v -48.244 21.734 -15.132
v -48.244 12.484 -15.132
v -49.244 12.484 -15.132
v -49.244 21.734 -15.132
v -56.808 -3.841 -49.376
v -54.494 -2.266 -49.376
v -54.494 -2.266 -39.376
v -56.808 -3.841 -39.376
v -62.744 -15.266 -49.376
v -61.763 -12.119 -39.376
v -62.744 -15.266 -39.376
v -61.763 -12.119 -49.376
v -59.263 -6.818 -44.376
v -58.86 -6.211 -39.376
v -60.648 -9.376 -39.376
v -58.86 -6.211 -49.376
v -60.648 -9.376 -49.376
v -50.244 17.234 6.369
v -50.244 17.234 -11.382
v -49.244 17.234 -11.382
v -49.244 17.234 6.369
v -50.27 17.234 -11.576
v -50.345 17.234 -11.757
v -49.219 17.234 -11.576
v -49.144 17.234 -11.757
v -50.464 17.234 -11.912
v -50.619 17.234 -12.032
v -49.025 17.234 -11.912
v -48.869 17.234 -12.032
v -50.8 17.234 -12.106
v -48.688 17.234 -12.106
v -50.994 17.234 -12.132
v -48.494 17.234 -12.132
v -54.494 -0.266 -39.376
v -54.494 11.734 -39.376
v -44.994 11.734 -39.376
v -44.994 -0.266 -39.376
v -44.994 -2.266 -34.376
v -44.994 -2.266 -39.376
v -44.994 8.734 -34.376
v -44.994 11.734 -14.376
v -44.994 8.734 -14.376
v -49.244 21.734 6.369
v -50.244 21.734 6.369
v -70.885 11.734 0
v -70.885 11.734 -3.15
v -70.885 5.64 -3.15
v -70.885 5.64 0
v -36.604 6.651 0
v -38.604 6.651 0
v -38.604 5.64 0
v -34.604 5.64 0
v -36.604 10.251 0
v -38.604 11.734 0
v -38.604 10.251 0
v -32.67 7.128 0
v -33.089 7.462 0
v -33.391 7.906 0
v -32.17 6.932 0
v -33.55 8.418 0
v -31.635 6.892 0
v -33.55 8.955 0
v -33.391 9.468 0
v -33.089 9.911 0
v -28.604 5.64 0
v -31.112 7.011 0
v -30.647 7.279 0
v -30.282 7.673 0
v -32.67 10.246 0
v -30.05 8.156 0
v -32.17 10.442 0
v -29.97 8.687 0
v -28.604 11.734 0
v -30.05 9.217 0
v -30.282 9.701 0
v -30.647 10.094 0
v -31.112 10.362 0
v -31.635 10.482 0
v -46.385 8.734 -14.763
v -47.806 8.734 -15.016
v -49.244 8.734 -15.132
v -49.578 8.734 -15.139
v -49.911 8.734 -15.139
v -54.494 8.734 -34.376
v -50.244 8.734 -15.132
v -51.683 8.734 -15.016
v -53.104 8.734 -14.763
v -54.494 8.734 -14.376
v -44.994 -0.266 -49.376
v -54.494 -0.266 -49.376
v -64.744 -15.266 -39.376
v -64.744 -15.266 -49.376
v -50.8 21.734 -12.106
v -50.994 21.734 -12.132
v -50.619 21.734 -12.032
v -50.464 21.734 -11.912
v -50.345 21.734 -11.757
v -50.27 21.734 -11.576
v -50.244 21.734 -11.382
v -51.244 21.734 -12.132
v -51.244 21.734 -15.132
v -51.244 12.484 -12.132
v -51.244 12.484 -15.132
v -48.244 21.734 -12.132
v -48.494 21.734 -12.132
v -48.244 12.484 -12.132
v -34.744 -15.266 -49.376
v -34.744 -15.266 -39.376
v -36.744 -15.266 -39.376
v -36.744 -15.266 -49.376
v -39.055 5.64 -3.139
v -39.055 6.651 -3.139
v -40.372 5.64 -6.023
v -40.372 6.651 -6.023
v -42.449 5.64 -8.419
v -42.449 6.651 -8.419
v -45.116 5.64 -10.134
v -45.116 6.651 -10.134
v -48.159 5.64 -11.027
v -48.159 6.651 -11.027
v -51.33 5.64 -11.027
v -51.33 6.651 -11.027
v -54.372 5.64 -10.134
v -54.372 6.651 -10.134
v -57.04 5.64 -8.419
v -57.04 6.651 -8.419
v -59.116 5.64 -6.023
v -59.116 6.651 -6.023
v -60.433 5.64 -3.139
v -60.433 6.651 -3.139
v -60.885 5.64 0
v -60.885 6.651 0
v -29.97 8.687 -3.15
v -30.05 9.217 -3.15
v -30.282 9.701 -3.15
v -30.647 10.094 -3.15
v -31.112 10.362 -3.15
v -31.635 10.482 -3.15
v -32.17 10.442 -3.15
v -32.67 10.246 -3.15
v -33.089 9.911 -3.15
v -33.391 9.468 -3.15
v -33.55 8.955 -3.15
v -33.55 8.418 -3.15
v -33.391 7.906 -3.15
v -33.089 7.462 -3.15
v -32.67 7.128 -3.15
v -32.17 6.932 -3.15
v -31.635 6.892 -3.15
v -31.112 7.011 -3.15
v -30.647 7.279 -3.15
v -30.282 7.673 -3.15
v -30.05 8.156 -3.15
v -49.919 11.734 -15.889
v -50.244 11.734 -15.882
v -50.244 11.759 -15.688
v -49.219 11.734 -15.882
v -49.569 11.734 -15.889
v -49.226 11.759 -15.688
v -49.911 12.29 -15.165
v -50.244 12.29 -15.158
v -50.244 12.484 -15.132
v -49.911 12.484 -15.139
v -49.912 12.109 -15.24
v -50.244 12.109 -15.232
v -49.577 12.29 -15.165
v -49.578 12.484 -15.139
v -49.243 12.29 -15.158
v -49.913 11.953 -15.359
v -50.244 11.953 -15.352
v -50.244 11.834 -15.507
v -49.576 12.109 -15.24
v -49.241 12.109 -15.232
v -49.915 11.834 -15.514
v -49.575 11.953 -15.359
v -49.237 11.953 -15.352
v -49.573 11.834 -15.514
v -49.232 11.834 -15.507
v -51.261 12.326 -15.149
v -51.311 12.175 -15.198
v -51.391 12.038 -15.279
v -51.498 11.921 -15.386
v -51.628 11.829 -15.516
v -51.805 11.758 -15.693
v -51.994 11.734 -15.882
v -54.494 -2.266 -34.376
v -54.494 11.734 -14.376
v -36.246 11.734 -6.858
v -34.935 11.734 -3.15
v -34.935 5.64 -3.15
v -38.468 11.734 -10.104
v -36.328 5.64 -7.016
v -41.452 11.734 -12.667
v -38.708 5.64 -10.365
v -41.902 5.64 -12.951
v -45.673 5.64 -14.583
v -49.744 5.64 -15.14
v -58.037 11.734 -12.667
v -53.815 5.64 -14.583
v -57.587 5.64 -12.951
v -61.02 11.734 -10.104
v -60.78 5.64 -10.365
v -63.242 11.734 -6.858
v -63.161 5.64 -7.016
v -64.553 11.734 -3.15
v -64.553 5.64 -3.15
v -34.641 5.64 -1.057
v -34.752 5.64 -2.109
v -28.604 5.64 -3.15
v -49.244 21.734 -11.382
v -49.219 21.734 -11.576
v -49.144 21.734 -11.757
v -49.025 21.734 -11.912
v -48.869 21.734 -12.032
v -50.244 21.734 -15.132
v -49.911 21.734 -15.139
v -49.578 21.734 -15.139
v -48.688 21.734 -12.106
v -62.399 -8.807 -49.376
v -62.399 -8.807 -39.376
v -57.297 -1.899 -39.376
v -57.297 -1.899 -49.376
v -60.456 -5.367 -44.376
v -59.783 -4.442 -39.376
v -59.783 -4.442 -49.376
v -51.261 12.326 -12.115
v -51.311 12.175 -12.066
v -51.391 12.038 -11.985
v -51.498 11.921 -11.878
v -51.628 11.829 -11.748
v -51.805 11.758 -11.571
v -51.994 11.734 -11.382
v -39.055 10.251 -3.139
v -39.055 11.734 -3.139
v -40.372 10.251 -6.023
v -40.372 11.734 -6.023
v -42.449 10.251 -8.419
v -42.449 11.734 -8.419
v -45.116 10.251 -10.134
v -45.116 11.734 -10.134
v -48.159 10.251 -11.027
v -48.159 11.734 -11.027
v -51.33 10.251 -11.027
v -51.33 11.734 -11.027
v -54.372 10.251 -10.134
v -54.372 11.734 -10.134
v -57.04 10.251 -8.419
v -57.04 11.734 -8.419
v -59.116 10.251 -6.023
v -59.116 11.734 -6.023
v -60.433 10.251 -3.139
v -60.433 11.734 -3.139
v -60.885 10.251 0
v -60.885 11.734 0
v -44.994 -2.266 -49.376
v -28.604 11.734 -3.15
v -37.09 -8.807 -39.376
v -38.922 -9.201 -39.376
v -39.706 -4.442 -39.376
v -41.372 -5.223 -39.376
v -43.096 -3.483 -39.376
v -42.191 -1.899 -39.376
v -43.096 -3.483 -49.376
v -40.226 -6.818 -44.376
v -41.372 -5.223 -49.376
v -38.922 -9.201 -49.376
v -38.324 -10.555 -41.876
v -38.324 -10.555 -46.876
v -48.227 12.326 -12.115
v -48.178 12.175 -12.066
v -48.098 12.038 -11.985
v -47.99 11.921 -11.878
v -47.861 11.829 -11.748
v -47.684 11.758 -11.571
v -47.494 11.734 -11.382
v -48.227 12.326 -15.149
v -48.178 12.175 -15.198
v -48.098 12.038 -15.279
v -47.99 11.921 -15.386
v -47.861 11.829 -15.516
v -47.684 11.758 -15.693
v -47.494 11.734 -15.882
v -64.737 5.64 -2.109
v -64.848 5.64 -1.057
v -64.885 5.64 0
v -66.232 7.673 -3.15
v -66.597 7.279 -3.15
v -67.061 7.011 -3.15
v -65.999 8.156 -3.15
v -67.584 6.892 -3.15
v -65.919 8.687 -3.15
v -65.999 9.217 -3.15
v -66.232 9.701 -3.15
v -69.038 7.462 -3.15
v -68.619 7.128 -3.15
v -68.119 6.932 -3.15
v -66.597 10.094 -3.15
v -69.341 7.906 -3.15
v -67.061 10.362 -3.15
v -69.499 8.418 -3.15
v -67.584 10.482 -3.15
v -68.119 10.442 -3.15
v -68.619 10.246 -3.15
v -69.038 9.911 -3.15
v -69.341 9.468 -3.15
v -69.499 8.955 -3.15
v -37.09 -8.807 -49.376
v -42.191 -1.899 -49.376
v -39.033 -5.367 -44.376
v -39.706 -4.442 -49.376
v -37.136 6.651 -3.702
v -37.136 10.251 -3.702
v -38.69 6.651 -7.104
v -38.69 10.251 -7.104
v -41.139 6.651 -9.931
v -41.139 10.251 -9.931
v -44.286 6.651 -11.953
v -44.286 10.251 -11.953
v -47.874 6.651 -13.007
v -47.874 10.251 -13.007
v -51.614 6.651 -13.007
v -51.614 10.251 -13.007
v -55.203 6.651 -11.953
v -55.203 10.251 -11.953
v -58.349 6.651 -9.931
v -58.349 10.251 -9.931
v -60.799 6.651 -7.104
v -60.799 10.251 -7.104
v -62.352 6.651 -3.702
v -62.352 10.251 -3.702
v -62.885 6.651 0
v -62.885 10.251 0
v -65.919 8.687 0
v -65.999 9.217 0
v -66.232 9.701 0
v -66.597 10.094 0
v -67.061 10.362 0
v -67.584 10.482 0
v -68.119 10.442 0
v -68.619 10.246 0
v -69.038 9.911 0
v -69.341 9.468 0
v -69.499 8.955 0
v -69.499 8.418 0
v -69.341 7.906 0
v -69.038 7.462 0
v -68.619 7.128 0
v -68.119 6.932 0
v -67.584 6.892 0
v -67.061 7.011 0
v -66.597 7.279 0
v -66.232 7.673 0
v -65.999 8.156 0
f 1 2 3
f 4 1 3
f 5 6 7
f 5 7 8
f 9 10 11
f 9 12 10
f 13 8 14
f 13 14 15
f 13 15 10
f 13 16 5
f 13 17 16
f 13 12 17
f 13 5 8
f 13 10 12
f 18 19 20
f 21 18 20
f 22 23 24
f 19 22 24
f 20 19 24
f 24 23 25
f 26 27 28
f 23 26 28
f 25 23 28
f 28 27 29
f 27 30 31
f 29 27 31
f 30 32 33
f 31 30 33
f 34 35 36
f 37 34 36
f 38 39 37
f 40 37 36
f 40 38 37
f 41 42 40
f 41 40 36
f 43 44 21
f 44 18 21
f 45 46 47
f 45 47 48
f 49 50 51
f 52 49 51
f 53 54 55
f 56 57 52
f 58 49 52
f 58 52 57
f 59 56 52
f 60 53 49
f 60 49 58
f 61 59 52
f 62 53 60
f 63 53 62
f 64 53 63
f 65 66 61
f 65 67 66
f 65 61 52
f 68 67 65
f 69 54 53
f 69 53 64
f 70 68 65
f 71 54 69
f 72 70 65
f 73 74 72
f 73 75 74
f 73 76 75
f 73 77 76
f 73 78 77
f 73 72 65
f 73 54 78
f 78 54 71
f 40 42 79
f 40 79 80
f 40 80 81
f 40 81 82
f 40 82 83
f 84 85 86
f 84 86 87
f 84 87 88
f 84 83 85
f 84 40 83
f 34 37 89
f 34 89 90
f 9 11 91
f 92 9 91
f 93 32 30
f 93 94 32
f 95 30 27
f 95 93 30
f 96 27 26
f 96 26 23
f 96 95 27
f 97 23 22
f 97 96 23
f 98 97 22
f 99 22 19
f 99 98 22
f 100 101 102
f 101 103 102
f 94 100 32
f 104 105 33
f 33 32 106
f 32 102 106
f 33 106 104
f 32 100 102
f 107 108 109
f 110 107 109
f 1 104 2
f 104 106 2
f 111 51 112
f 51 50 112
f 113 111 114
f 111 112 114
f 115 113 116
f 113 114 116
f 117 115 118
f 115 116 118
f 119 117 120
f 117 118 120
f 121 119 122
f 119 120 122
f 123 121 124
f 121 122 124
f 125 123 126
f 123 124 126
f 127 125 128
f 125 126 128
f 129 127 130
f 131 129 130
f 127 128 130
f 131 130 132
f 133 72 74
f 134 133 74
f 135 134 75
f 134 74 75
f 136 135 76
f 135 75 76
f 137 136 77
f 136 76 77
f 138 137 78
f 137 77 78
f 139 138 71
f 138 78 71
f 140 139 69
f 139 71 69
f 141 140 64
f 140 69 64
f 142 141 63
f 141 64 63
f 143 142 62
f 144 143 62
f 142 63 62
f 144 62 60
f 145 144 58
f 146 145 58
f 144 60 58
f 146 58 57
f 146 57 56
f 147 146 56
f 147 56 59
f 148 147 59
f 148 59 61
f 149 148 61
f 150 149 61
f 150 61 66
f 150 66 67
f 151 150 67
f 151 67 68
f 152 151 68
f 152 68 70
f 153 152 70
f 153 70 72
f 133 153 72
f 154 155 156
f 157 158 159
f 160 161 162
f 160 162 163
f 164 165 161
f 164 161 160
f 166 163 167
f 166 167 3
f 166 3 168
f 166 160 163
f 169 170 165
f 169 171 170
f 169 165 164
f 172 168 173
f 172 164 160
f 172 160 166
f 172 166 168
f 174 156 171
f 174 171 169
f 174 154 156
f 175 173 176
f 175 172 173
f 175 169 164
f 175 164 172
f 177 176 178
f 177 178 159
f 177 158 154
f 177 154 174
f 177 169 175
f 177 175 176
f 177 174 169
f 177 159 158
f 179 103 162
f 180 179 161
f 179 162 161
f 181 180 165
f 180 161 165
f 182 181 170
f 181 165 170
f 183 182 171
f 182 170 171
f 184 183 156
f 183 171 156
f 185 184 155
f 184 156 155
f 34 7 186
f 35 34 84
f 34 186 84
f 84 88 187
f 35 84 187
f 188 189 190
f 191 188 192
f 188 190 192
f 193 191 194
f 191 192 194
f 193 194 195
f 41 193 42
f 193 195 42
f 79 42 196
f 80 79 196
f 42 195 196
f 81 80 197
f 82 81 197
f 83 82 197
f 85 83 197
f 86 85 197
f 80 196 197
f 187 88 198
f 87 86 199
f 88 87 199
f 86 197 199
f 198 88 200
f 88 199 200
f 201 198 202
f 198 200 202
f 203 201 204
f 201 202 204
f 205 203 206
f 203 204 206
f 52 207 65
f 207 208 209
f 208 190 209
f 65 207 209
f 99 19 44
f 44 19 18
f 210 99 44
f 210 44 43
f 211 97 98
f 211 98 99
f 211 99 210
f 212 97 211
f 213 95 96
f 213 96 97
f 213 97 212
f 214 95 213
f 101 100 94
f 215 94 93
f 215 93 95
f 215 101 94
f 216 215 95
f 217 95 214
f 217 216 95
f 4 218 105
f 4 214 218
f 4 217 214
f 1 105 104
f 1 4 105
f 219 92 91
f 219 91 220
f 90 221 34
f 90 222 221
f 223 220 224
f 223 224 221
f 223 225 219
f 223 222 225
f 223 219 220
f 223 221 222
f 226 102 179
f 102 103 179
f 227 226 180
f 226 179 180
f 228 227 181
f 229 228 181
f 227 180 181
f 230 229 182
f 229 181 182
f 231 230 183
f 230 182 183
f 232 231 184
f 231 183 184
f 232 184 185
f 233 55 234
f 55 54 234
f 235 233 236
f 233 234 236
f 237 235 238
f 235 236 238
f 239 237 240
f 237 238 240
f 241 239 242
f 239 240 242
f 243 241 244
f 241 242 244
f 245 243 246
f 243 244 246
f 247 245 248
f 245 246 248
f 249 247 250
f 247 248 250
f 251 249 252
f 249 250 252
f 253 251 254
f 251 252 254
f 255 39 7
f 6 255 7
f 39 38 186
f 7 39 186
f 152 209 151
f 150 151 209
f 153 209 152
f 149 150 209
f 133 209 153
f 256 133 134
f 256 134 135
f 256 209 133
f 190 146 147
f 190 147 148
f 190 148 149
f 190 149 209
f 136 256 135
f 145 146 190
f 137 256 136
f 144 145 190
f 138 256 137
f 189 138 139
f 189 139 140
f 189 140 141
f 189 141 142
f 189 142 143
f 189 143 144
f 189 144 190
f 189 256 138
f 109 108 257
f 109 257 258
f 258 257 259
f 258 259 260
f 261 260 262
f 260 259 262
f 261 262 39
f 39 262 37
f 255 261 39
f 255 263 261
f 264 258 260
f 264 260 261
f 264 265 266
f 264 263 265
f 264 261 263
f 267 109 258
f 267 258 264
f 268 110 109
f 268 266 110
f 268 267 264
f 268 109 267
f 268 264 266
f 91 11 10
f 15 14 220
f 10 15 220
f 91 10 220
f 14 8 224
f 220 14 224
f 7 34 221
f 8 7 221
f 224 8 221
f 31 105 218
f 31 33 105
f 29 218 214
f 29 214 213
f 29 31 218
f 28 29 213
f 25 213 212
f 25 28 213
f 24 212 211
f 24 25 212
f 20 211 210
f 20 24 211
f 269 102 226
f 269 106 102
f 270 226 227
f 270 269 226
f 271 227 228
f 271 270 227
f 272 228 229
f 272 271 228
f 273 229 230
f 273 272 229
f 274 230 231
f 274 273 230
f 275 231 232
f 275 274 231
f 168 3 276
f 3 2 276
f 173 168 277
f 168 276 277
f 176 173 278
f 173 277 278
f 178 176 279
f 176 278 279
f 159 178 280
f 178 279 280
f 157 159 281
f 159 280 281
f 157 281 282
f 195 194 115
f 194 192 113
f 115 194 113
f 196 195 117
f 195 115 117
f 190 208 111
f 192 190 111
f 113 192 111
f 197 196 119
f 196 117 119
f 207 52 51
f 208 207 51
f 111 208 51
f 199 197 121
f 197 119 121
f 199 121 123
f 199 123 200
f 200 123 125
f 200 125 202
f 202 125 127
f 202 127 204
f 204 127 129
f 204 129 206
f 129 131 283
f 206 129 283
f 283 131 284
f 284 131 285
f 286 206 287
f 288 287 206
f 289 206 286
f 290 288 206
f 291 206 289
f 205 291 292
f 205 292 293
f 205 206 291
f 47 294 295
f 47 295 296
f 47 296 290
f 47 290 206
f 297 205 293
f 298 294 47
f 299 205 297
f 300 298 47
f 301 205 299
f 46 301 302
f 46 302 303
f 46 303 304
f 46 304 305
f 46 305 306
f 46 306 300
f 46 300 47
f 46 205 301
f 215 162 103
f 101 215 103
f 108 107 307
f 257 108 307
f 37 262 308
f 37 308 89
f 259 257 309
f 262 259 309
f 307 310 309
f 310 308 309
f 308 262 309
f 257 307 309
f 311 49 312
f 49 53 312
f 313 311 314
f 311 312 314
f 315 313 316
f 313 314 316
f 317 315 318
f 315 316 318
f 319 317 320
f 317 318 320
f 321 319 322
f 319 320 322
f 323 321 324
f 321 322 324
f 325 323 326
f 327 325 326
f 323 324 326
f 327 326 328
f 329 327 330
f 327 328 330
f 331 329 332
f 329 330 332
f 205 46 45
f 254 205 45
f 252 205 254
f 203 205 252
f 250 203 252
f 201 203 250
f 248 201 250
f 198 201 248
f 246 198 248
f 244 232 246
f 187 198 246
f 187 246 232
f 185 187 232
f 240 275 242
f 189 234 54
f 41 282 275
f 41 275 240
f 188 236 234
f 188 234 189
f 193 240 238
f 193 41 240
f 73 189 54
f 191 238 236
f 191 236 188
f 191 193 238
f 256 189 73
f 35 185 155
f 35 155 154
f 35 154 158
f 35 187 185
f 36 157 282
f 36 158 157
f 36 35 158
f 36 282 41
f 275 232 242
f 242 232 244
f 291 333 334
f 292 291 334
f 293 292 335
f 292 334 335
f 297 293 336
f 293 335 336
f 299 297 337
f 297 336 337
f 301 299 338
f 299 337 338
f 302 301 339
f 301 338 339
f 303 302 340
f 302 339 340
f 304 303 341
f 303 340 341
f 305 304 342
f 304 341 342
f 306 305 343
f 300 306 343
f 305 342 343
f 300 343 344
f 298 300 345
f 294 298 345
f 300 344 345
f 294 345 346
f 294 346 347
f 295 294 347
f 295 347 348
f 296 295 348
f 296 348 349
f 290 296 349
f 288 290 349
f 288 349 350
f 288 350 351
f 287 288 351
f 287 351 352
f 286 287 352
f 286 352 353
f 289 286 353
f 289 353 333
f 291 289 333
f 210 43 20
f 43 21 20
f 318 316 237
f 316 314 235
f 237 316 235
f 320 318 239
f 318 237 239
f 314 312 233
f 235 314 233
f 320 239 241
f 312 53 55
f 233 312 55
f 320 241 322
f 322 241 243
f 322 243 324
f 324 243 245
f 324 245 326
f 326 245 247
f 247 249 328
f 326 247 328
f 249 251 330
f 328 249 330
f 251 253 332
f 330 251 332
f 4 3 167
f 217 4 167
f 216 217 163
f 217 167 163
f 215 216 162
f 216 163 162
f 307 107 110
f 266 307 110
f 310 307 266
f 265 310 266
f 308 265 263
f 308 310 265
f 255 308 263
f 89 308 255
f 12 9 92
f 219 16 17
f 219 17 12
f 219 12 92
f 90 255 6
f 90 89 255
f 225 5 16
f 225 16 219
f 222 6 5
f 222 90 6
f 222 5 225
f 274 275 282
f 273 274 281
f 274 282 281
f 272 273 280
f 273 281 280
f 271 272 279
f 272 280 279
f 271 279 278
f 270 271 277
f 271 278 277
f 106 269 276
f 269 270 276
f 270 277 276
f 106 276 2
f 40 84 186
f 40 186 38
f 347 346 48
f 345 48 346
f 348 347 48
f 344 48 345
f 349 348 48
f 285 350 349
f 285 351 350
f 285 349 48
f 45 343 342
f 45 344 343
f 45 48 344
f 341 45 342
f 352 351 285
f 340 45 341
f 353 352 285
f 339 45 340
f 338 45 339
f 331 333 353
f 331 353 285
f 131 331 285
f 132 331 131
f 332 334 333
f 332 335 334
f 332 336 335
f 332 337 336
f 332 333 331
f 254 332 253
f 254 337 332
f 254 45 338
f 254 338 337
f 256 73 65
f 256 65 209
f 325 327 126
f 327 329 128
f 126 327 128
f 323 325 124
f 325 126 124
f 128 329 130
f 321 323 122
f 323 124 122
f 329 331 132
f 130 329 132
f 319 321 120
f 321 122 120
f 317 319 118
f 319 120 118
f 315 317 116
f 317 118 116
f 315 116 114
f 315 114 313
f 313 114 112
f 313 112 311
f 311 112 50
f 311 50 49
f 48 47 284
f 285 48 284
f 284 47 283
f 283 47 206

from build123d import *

# Parameters (mm, degrees)
BOSS_EXTRUDE1_DEPTH = 8.5
BOSS_EXTRUDE2_DEPTH = 3
BOSS_EXTRUDE3_DEPTH = 3
SKETCH10_W          = 9.5
SKETCH10_H          = 5
BOSS_EXTRUDE4_DEPTH = 11
SKETCH11_W          = 9.5
SKETCH11_H          = 2
BOSS_EXTRUDE5_DEPTH = 10
BOSS_EXTRUDE6_DEPTH = 6.09393
SKETCH14_R          = 1.8
CUT_EXTRUDE1_DEPTH  = 6.3
SKETCH15_W          = 51.153217575
SKETCH15_H          = 21.210560201
CUT_EXTRUDE3_DEPTH  = 15
SKETCH18_W          = 3
SKETCH18_H          = 3
BOSS_EXTRUDE7_DEPTH = 8.5
FILLET1_R           = 0.75
BOSS_EXTRUDE8_DEPTH = 1.5
FILLET2_R           = 0.75
BOSS_EXTRUDE9_DEPTH = 10


with BuildPart() as part:
    # Sketch3 → Revolve1 (revolve)
    with BuildSketch(Plane.XY):
        Polygon((-62.694264441, 11.733728816), (-64.884531744, 11.733728816), (-64.884531744, 5.639799249), (-60.884531744, 5.639799249), (-60.884531744, 6.650679103), (-62.884531744, 6.650679103), (-62.884531744, 10.250679103), (-60.884531744, 10.250679103), (-60.884531744, 11.733728816), align=None)
    revolve(axis=Axis((-49.744264441, 0, 0), (0, 1, 0)))

    # Sketch7 → Boss-Extrude1 (add)
    with BuildSketch(Plane(origin=(0, 11.733728816, 0), x_dir=(1, 0, 0), z_dir=(0, 1, 0))):
        with BuildLine():
            Line((-50.244264441, 15.132008921), (-50.244264441, 13.130751112))
            ThreePointArc((-50.244264441, 13.130751112), (-49.744264441, 13.140267302), (-49.244264441, 13.130751112))
            Line((-49.244264441, 13.130751112), (-49.244264441, 15.132008921))
            ThreePointArc((-49.244264441, 15.132008921), (-49.744264441, 15.140267302), (-50.244264441, 15.132008921))
        make_face()
    extrude(amount=BOSS_EXTRUDE1_DEPTH)

    # Sketch8 → Boss-Extrude2 (add)
    with BuildSketch(Plane(origin=(0, 20.233728816, 0), x_dir=(1, 0, 0), z_dir=(0, 1, 0))):
        with BuildLine():
            Line((-50.244264441, 15.132008921), (-50.244264441, 13.130751112))
            Line((-50.244264441, 13.130751112), (-50.244264441, -6.369248888))
            Line((-50.244264441, -6.369248888), (-49.244264441, -6.369248888))
            Line((-49.244264441, -6.369248888), (-49.244264441, 13.130751112))
            Line((-49.244264441, 13.130751112), (-49.244264441, 15.132008921))
            ThreePointArc((-49.244264441, 15.132008921), (-49.744264441, 15.140267302), (-50.244264441, 15.132008921))
        make_face()
    extrude(amount=-BOSS_EXTRUDE2_DEPTH)

    # Sketch9 → Boss-Extrude3 (add)
    with BuildSketch(Plane(origin=(0, 11.733728816, 0), x_dir=(1, 0, 0), z_dir=(0, 1, 0))):
        with BuildLine():
            Line((-54.494264441, 14.375854548), (-54.494264441, 39.375854548))
            Line((-54.494264441, 39.375854548), (-44.994264441, 39.375854548))
            Line((-44.994264441, 39.375854548), (-44.994264441, 14.375854548))
            ThreePointArc((-44.994264441, 14.375854548), (-47.092177082, 14.906177465), (-49.244264441, 15.132008921))
            ThreePointArc((-49.244264441, 15.132008921), (-49.744264441, 15.140267302), (-50.244264441, 15.132008921))
            ThreePointArc((-50.244264441, 15.132008921), (-52.3963518, 14.906177465), (-54.494264441, 14.375854548))
        make_face()
    extrude(amount=-BOSS_EXTRUDE3_DEPTH)

    # Sketch10 → Boss-Extrude4 (add)
    with BuildSketch(Plane.XZ.offset(-8.733728816)):
        with Locations((-49.744264441, -36.875854548)):
            Rectangle(SKETCH10_W, SKETCH10_H)
    extrude(amount=BOSS_EXTRUDE4_DEPTH)

    # Sketch11 → Boss-Extrude5 (add)
    with BuildSketch(Plane(origin=(0, 0, -39.375854548), x_dir=(-1, 0, 0), z_dir=(0, 0, -1))):
        with Locations((49.744264441, -1.266271184)):
            Rectangle(SKETCH11_W, SKETCH11_H)
    extrude(amount=BOSS_EXTRUDE5_DEPTH)

    # Sketch13 → Boss-Extrude6 (add)
    with BuildSketch(Plane(origin=(0, 11.733728816, 0), x_dir=(1, 0, 0), z_dir=(0, 1, 0))):
        with BuildLine():
            Line((-28.603997139, 3.15), (-34.935307895, 3.15))
            ThreePointArc((-34.935307895, 3.15), (-34.603997139, 0), (-34.935307895, -3.15))
            Line((-34.935307895, -3.15), (-28.603997139, -3.15))
            Line((-28.603997139, -3.15), (-28.603997139, 3.15))
        make_face()
        with BuildLine():
            Line((-70.884531744, 3.15), (-70.884531744, -3.15))
            Line((-70.884531744, -3.15), (-64.553220987, -3.15))
            ThreePointArc((-64.553220987, -3.15), (-64.884531744, 0), (-64.553220987, 3.15))
            Line((-64.553220987, 3.15), (-70.884531744, 3.15))
        make_face()
    extrude(amount=-BOSS_EXTRUDE6_DEPTH)

    # Sketch14 → Cut-Extrude1 (cut)
    with BuildSketch(Plane.XY.offset(3.15)):
        with Locations((-31.769652517, 8.686764033)):
            Circle(SKETCH14_R)
        with Locations((-67.718876365, 8.686764033)):
            Circle(SKETCH14_R)
    extrude(amount=-CUT_EXTRUDE1_DEPTH, mode=Mode.SUBTRACT)

    # Sketch15 → Cut-Extrude3 (cut, through all)
    with BuildSketch(Plane(origin=(0, 11.733728816, 0), x_dir=(1, 0, 0), z_dir=(0, 1, 0))):
        with Locations((-49.018725857, -10.6052801)):
            Rectangle(SKETCH15_W, SKETCH15_H)
    extrude(amount=-CUT_EXTRUDE3_DEPTH, mode=Mode.SUBTRACT)

    # Sketch18 → Boss-Extrude7 (add)
    with BuildSketch(Plane(origin=(0, 11.733728816, 0), x_dir=(1, 0, 0), z_dir=(0, 1, 0))):
        with Locations((-49.744264441, 13.632008921)):
            Rectangle(SKETCH18_W, SKETCH18_H)
    extrude(amount=BOSS_EXTRUDE7_DEPTH)

    # Fillet1
    fillet1_edges = [part.edges().sort_by_distance(p)[0] for p in [
        (-50.744264441, 11.733728816, -15.132008921),
        (-48.744264441, 11.733728816, -15.132008921),
        (-49.744264441, 11.733728816, -12.132008921),
        (-48.244264441, 11.733728816, -13.632008921),
        (-51.244264441, 11.733728816, -13.632008921),
        (-49.744264441, 11.733728816, -15.140267302),
    ]]
    fillet(fillet1_edges, radius=FILLET1_R)

    # Sketch19 → Boss-Extrude8 (add)
    with BuildSketch(Plane(origin=(0, 20.233728816, 0), x_dir=(1, 0, 0), z_dir=(0, 1, 0))):
        with BuildLine():
            Line((-50.244264441, 15.132008921), (-51.244264441, 15.132008921))
            Line((-51.244264441, 15.132008921), (-51.244264441, 12.132008921))
            Line((-51.244264441, 12.132008921), (-50.244264441, 12.132008921))
            Line((-50.244264441, 12.132008921), (-50.244264441, -6.369248888))
            Line((-50.244264441, -6.369248888), (-49.244264441, -6.369248888))
            Line((-49.244264441, -6.369248888), (-49.244264441, 12.132008921))
            Line((-49.244264441, 12.132008921), (-48.244264441, 12.132008921))
            Line((-48.244264441, 12.132008921), (-48.244264441, 15.132008921))
            Line((-48.244264441, 15.132008921), (-49.244264441, 15.132008921))
            ThreePointArc((-49.244264441, 15.132008921), (-49.744264441, 15.140267302), (-50.244264441, 15.132008921))
        make_face()
    extrude(amount=BOSS_EXTRUDE8_DEPTH)

    # Fillet2
    fillet2_edges = [part.edges().sort_by_distance(p)[0] for p in [
        (-50.244264441, 19.483728816, -12.132008921),
        (-49.244264441, 19.483728816, -12.132008921),
    ]]
    fillet(fillet2_edges, radius=FILLET2_R)

    # Sketch20 → Boss-Extrude9 (add)
    with BuildSketch(Plane(origin=(0, 0, -49.375854548), x_dir=(-1, 0, 0), z_dir=(0, 0, -1))):
        with BuildLine():
            Line((34.744264441, -15.266271184), (36.744264441, -15.266271184))
            add(Edge.make_bspline(
                [(36.744264441, -15.266271184), (39.582311707, -4.870122804), (44.994264441, -2.266271184)],
                knots=[0, 0, 0, 0.599407443, 0.599407443, 0.599407443], degree=2))
            Line((44.994264441, -2.266271184), (54.494264441, -2.266271184))
            add(Edge.make_bspline(
                [(54.494264441, -2.266271184), (59.906217176, -4.870122804), (62.744264441, -15.266271184)],
                knots=[0.400592557, 0.400592557, 0.400592557, 1, 1, 1], degree=2))
            Line((62.744264441, -15.266271184), (64.744264441, -15.266271184))
            add(Edge.make_bspline(
                [(64.744264441, -15.266271184), (61.29176104, -2.966792571), (54.494264441, -0.266271184)],
                knots=[0, 0, 0, 0.639930482, 0.639930482, 0.639930482], degree=2))
            Line((54.494264441, -0.266271184), (44.994264441, -0.266271184))
            add(Edge.make_bspline(
                [(34.744264441, -15.266271184), (38.196767843, -2.966792571), (44.994264441, -0.266271184)],
                knots=[0, 0, 0, 0.639930482, 0.639930482, 0.639930482], degree=2))
        make_face()
    extrude(amount=-BOSS_EXTRUDE9_DEPTH)


solid = part.part
